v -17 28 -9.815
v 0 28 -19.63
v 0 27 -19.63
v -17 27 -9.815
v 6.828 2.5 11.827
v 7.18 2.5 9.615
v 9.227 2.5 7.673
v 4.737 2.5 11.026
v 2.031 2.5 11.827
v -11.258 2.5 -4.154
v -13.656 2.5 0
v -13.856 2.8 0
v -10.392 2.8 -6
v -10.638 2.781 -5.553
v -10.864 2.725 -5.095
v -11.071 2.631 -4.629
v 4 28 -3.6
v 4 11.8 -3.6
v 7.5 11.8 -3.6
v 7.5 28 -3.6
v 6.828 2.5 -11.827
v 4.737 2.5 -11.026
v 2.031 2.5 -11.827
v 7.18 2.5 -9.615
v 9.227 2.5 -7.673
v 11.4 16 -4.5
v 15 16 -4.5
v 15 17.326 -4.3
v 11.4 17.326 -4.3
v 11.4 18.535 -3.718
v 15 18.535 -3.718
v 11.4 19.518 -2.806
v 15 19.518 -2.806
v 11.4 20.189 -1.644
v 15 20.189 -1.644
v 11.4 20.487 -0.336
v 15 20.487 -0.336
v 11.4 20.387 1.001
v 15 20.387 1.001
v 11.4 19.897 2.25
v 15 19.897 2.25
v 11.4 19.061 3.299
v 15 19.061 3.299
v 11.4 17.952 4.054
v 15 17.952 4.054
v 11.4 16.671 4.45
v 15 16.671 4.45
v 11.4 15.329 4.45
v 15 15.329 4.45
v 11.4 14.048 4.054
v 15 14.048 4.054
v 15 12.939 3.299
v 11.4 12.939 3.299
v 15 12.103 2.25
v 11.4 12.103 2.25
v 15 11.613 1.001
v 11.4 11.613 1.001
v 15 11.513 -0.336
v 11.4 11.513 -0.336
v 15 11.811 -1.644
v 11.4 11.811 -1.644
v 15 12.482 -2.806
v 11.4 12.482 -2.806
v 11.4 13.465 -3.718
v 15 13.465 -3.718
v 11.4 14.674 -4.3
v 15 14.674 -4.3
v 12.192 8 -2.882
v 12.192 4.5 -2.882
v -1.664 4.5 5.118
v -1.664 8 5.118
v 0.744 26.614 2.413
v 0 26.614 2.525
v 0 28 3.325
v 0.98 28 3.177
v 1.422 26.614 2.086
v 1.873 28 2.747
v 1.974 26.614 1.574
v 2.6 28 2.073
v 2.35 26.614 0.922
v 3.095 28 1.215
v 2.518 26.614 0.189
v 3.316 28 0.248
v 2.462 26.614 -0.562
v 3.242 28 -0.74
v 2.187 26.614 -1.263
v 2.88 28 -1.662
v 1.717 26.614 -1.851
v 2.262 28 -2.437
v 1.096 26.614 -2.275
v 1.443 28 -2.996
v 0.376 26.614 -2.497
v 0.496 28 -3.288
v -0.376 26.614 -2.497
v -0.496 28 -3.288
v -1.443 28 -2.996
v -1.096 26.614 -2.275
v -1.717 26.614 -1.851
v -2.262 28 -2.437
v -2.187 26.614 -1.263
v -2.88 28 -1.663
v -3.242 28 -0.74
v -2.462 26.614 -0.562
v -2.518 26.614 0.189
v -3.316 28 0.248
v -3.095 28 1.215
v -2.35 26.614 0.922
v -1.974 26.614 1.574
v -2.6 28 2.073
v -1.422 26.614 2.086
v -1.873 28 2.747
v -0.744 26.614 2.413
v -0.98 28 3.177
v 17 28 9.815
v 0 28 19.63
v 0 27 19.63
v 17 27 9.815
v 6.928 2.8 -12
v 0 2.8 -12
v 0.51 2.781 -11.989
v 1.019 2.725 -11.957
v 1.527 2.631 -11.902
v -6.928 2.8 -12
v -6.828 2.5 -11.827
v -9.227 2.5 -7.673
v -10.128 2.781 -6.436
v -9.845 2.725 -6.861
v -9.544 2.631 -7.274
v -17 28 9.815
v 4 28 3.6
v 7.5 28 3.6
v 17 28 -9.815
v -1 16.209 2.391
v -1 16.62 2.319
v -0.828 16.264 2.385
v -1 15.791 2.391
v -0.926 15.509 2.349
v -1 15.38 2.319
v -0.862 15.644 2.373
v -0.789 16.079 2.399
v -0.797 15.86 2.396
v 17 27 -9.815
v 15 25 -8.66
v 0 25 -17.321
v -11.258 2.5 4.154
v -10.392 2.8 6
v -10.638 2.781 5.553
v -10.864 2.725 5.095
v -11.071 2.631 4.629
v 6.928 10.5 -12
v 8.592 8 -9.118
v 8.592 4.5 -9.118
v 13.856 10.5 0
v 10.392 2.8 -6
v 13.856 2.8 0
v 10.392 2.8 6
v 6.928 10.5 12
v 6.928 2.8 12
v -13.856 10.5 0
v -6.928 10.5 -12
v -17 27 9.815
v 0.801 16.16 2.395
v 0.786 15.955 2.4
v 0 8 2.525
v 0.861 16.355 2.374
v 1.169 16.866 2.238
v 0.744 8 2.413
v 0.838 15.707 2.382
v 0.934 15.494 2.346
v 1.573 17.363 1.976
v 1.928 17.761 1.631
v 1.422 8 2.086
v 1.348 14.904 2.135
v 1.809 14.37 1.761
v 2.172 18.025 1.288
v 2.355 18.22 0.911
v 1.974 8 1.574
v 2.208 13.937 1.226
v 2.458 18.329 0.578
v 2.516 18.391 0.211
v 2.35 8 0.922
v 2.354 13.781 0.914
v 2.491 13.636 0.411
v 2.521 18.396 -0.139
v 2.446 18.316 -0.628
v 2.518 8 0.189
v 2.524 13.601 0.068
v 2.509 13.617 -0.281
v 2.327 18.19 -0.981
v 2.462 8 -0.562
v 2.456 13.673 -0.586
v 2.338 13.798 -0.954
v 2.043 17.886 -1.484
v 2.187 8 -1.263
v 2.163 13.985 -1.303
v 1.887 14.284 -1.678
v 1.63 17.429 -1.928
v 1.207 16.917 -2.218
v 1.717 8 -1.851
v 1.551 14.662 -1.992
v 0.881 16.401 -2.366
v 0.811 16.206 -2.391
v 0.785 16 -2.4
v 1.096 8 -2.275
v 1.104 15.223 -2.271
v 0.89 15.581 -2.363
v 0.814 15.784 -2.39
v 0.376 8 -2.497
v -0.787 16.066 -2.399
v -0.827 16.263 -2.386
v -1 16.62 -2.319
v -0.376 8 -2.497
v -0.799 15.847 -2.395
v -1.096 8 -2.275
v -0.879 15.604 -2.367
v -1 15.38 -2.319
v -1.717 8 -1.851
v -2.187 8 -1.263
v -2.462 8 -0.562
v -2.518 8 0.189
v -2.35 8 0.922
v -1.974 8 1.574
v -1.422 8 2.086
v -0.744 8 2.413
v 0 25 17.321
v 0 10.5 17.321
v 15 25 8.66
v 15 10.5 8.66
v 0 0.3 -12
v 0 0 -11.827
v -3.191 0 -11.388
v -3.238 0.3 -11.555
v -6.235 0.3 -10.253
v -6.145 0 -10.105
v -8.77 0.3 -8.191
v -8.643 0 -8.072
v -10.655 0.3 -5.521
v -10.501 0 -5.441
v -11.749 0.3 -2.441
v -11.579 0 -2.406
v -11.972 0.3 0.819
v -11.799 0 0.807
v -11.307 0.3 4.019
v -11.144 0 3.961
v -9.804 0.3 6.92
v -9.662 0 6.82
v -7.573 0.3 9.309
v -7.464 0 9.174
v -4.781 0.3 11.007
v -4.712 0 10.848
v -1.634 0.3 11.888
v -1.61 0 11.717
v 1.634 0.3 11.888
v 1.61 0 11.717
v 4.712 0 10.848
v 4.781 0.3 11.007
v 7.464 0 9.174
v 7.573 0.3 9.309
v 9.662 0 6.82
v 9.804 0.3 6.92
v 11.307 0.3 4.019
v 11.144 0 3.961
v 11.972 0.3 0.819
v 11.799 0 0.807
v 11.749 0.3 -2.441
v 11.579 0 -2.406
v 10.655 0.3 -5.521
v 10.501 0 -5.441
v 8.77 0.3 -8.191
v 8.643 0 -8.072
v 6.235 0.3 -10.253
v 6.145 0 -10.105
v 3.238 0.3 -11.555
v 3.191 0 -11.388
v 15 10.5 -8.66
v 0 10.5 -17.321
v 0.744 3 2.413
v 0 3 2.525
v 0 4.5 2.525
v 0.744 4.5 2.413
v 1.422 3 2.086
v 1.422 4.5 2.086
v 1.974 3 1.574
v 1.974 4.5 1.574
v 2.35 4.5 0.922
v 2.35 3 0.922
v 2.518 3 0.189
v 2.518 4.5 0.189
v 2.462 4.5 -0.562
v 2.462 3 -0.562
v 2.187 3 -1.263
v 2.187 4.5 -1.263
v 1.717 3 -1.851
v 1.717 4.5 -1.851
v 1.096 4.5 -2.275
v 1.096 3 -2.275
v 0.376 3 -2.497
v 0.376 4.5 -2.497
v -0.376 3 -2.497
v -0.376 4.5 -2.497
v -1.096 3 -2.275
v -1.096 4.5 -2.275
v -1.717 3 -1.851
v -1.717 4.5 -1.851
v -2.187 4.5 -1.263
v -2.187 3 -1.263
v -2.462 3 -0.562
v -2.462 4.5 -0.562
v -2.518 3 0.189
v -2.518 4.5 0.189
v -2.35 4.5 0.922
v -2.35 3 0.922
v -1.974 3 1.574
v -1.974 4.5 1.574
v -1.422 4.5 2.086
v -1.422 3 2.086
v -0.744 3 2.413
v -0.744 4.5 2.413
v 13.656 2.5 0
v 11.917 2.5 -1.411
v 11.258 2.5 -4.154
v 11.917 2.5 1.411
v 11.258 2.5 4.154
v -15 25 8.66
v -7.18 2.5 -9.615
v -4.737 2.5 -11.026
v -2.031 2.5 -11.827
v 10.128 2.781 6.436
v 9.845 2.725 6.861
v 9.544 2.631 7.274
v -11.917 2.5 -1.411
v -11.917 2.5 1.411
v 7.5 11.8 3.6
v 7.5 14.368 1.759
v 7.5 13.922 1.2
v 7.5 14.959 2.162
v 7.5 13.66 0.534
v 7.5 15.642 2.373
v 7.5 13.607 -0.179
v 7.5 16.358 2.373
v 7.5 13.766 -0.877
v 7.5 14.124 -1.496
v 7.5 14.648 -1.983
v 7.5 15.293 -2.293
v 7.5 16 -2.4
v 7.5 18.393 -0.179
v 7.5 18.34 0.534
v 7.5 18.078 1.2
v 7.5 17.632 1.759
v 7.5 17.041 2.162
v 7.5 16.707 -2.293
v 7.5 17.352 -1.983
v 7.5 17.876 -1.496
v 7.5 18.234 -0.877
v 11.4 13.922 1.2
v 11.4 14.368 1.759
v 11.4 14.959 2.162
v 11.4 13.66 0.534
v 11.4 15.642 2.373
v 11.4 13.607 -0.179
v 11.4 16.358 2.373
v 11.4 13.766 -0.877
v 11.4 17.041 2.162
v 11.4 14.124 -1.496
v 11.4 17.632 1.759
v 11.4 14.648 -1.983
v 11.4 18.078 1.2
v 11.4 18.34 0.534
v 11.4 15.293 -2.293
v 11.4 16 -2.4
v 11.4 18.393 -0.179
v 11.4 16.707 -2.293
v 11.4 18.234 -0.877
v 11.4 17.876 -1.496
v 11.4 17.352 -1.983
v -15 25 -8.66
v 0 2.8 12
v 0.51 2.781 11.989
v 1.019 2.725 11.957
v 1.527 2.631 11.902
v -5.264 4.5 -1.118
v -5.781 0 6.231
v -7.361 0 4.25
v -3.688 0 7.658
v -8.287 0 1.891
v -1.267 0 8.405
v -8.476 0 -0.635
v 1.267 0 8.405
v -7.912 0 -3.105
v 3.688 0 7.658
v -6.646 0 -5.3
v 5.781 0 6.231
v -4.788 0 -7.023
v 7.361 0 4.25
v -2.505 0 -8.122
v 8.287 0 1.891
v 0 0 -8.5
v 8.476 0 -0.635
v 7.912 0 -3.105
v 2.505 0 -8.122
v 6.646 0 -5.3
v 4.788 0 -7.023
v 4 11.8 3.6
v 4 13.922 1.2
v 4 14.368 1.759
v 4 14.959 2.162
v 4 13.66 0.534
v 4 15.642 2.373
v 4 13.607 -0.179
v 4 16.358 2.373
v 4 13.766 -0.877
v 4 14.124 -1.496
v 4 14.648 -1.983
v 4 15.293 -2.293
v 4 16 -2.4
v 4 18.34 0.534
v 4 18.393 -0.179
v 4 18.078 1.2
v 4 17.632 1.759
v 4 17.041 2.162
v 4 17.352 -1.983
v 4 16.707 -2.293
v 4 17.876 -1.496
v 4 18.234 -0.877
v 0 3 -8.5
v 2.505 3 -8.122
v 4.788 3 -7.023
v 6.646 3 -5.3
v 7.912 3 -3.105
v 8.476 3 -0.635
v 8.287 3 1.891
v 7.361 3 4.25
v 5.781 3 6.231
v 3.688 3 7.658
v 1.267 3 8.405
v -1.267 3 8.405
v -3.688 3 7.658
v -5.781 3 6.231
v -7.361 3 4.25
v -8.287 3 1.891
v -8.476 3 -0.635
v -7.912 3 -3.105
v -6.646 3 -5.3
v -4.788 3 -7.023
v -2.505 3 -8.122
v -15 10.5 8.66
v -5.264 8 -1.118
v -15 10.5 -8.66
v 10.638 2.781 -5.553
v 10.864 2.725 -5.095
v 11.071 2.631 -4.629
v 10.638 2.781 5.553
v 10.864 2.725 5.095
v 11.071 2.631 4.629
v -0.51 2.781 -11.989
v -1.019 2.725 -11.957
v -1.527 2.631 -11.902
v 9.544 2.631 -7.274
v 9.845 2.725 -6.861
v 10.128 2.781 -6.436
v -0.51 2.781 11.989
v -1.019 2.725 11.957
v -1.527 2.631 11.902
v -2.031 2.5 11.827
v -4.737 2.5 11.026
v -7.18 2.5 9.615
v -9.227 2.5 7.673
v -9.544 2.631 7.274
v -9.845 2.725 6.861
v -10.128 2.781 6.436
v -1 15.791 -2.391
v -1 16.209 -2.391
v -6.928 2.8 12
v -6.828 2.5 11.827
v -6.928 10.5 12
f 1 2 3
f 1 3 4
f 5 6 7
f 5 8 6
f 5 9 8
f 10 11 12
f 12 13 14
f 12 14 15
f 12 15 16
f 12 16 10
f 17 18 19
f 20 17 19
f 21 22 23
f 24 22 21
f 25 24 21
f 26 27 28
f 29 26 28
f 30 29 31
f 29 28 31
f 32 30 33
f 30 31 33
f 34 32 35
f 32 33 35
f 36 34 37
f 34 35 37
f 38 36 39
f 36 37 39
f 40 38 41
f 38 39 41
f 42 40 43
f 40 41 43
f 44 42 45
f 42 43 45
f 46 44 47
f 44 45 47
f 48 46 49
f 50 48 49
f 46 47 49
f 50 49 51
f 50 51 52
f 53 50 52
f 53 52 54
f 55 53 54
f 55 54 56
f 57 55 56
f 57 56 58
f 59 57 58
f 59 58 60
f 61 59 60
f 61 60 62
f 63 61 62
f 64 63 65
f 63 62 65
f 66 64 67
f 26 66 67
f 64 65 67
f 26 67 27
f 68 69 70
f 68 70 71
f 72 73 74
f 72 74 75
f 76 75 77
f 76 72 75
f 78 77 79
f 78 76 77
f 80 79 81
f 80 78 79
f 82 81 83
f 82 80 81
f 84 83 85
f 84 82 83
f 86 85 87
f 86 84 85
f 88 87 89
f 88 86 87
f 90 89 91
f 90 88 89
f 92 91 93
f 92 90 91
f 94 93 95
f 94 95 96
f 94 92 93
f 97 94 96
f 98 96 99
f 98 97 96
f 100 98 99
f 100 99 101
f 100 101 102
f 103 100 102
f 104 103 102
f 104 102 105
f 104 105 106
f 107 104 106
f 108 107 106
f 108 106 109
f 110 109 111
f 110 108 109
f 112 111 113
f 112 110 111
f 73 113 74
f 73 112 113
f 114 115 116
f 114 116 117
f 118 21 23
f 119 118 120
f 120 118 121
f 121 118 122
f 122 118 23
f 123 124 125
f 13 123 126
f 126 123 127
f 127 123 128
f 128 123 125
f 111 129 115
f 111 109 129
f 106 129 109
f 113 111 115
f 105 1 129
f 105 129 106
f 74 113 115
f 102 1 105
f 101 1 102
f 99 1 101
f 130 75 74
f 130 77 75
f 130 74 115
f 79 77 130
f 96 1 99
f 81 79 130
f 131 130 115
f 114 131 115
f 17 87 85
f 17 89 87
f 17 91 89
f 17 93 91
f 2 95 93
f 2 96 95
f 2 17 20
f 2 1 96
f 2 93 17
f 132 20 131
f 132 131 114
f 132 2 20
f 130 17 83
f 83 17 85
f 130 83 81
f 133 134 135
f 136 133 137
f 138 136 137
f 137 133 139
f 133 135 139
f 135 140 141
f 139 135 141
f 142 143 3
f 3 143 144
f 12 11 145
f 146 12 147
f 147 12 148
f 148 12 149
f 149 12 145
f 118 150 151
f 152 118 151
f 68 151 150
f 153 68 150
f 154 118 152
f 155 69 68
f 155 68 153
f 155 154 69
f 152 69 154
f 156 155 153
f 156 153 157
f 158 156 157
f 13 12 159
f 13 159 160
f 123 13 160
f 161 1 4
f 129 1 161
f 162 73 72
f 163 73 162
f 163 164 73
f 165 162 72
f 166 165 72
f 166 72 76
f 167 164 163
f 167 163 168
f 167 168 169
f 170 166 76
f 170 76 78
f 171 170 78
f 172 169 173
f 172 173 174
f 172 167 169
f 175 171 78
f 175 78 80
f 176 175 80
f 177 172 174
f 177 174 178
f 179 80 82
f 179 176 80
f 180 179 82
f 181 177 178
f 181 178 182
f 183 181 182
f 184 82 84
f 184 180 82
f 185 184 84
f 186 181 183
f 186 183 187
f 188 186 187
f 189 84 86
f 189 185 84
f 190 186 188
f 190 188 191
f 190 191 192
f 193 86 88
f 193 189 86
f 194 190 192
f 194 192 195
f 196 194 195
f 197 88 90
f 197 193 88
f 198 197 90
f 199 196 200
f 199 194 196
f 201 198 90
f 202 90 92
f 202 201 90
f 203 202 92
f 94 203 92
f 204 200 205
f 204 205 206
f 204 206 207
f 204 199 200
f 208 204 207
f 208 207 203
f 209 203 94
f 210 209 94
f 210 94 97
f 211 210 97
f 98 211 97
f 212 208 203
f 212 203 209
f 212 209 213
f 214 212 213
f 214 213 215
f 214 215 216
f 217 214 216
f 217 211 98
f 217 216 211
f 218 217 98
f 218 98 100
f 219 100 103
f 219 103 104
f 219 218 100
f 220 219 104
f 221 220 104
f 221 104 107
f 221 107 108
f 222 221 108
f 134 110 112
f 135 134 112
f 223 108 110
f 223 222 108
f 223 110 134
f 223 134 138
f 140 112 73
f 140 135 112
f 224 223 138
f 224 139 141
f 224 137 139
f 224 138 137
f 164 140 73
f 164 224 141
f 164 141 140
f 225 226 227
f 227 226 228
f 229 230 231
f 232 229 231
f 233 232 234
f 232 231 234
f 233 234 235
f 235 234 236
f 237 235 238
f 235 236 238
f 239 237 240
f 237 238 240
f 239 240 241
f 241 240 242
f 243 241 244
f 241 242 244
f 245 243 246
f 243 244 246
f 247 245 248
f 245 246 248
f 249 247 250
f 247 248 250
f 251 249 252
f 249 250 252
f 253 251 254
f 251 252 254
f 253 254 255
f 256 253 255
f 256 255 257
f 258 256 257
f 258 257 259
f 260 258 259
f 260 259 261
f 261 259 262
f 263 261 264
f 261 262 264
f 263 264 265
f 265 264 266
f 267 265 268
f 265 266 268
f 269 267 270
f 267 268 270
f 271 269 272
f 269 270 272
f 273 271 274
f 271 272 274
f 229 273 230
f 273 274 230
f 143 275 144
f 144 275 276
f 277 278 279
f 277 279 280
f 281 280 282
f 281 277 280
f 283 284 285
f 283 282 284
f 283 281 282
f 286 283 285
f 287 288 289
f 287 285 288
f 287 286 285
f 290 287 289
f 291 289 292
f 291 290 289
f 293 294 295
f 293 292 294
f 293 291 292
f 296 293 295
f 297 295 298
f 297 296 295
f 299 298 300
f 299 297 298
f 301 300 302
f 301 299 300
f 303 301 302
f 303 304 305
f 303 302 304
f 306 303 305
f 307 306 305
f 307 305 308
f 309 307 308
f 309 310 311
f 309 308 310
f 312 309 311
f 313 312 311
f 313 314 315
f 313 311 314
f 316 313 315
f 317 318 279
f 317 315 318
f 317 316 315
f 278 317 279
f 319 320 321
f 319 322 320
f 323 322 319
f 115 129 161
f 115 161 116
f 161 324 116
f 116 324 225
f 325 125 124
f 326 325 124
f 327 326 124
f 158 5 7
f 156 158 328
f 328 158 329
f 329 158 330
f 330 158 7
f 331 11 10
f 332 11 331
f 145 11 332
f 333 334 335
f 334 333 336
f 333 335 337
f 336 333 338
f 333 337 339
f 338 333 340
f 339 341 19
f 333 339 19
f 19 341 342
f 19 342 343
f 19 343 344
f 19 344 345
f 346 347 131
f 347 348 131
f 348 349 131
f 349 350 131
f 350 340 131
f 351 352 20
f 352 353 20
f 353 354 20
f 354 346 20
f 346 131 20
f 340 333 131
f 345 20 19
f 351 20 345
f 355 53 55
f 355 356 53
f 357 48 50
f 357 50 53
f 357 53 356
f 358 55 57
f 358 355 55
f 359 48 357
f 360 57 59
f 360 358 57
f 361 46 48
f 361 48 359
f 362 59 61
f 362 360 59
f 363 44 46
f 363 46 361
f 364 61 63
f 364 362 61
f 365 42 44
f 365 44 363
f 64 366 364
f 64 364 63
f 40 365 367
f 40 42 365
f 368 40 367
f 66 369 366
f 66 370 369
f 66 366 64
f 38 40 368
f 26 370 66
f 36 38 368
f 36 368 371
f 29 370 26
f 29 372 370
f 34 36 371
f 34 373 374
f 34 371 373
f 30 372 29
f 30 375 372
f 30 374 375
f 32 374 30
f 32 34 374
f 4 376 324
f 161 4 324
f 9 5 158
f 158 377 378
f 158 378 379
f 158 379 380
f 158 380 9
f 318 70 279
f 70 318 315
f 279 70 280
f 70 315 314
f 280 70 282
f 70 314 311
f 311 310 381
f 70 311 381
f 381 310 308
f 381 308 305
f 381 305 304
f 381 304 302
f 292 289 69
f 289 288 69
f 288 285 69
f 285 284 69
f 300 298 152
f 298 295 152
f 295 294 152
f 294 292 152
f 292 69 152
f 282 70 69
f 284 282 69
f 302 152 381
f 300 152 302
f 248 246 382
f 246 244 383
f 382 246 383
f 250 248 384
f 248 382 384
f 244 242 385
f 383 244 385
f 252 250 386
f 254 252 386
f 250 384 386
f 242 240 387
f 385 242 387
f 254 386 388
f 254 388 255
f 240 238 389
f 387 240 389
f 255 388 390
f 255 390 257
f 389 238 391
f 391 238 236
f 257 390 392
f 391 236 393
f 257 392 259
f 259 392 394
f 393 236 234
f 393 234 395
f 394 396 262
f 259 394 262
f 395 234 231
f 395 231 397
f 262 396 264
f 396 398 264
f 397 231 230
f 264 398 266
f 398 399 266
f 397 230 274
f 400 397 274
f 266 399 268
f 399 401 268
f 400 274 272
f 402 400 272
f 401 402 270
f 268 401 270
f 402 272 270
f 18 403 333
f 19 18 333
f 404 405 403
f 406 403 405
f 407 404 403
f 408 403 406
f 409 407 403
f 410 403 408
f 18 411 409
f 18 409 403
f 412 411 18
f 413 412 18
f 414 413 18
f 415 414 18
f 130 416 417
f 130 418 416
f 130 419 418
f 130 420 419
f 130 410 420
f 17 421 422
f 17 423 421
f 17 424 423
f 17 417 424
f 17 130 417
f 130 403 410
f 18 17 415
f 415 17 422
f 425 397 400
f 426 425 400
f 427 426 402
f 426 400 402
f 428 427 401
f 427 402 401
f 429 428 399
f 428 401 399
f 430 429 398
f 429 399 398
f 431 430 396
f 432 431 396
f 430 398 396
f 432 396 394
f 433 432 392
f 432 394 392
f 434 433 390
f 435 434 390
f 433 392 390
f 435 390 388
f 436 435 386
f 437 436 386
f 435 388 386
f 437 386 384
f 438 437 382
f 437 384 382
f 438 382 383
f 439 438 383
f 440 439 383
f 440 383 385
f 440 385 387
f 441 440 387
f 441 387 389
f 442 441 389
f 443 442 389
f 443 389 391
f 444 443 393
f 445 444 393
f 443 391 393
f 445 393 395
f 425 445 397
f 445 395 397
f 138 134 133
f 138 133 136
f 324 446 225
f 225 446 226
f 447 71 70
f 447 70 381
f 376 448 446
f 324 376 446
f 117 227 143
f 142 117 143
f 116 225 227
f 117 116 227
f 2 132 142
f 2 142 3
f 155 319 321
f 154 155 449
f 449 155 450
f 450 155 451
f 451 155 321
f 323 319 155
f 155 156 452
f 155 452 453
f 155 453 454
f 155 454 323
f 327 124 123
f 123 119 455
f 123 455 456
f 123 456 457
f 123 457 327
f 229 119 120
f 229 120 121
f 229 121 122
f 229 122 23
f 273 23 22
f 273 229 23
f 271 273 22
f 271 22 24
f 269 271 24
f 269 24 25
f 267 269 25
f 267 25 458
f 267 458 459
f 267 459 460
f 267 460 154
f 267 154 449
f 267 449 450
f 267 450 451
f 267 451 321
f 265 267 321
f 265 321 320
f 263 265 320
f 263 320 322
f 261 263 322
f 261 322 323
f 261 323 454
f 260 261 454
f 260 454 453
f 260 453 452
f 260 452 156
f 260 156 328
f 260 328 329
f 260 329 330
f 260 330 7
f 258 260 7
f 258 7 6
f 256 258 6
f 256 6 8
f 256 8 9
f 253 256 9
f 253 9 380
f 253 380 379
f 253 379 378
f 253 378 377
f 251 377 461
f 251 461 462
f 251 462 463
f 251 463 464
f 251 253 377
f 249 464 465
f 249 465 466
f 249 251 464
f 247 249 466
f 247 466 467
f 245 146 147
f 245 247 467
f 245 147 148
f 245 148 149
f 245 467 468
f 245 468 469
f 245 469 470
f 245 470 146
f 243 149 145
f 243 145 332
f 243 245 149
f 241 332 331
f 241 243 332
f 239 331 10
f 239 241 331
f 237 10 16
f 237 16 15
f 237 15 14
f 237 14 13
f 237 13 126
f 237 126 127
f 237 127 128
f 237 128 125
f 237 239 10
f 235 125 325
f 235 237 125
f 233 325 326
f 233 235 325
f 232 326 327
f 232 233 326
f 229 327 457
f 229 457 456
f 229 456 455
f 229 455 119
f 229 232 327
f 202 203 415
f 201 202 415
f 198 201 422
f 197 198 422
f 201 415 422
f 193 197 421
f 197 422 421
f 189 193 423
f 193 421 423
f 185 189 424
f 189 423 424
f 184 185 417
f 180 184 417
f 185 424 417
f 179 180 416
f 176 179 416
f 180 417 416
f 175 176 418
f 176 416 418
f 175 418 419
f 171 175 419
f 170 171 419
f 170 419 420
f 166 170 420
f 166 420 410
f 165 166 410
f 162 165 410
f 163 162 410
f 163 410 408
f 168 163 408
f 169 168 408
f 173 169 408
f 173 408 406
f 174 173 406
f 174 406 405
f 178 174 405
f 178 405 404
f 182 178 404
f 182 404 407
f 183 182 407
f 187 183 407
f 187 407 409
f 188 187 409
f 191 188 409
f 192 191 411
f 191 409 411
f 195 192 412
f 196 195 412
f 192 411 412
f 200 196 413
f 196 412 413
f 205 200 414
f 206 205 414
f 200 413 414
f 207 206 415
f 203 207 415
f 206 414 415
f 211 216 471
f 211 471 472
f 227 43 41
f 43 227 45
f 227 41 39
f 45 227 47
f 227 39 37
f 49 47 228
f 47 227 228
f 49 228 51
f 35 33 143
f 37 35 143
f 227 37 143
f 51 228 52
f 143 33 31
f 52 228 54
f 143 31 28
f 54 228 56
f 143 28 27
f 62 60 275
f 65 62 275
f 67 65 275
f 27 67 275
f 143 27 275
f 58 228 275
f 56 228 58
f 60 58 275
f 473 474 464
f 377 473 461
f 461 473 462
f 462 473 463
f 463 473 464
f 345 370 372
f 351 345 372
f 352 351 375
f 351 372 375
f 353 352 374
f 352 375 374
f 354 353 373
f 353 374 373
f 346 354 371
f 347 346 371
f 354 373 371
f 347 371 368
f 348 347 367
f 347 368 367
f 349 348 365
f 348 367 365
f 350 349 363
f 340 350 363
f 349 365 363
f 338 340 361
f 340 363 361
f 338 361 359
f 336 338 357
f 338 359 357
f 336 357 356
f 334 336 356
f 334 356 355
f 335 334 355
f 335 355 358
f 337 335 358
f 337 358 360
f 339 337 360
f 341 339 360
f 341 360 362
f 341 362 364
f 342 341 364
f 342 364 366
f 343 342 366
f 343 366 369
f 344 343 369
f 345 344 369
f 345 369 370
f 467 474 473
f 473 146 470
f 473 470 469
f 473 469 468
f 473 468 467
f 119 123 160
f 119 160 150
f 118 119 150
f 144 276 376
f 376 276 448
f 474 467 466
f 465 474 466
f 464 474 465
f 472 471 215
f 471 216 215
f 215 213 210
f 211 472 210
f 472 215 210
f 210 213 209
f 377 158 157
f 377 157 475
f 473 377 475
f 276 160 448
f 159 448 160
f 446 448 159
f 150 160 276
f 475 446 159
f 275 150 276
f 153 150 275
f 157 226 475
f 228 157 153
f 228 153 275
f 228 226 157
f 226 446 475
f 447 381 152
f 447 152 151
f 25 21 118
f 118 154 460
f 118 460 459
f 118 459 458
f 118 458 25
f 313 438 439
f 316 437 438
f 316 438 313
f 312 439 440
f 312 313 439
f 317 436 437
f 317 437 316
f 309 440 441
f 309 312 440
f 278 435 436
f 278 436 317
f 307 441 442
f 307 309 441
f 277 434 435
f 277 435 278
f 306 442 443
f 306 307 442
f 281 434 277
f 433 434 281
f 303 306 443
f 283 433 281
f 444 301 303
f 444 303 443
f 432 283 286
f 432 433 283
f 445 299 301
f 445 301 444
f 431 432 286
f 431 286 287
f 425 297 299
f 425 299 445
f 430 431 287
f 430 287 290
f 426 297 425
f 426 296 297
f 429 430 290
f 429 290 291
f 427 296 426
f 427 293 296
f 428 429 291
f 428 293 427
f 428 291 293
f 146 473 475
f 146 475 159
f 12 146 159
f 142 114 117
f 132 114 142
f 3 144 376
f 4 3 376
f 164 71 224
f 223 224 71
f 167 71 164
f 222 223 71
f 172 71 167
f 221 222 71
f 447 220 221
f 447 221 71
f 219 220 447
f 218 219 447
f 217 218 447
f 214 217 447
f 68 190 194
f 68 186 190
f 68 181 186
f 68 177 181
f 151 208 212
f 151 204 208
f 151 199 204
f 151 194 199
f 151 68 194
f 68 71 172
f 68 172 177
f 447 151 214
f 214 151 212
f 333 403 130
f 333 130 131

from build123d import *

# Parameters (mm, degrees)
SKIZZE1_R                       = 2.525
AUFSATZ_LINEAR_AUSTRAGEN1_DEPTH = 28
SKIZZE2_W                       = 3.5
SKIZZE2_H                       = 7.2
SCHNITT_LINEAR_AUSTRAGEN1_DEPTH = 16.2
SKIZZE4_R                       = 2.4
SCHNITT_LINEAR_AUSTRAGEN2_DEPTH = 16
SKIZZE6_R                       = 14.009035946
AUFSATZ_LINEAR_AUSTRAGEN3_DEPTH = 3
SKIZZE7_R                       = 20
SCHNITT_LINEAR_AUSTRAGEN4_DEPTH = 10.5
FASE1_SIZE                      = 0.8
FASE1_SIZE2                     = 1.385640646
SKIZZE9_W                       = 7.2
SKIZZE9_H                       = 3.5
SCHNITT_LINEAR_AUSTRAGEN5_DEPTH = 16
SKIZZE10_R                      = 8.5
SCHNITT_LINEAR_AUSTRAGEN6_DEPTH = 3
FASE2_SIZE                      = 2
SKIZZE11_R                      = 4.5
SCHNITT_LINEAR_AUSTRAGEN7_DEPTH = 3.6
SKIZZE12_R                      = 14.338361474
SKIZZE12_R_2                    = 12
SCHNITT_LINEAR_AUSTRAGEN8_DEPTH = 2.5
FASE3_SIZE                      = 0.3
FASE3_SIZE2                     = 0.173205081
FASE4_SIZE                      = 0.173205081
FASE4_SIZE_2                    = 0.3


# Some blends are built 0.0001 mm under size
with BuildPart() as part:
    # Skizze1 → Aufsatz-Linear austragen1 (new body)
    with BuildSketch(Plane(origin=(0, 0, 0), x_dir=(1, 0, 0), z_dir=(0, 1, 0))):
        Polygon((15, 8.660254038), (0, 17.320508076), (-15, 8.660254038), (-15, -8.660254038), (0, -17.320508076), (15, -8.660254038), align=None)
        with Locations(Location((0, 0, 0), (0, 0, 270))):
            Circle(SKIZZE1_R, mode=Mode.SUBTRACT)
    extrude(amount=AUFSATZ_LINEAR_AUSTRAGEN1_DEPTH)

    # Skizze2 → Schnitt-Linear austragen1 (cut)
    with BuildSketch(Plane(origin=(0, 28, 0), x_dir=(1, 0, 0), z_dir=(0, 1, 0))):
        with Locations((5.75, 0)):
            Rectangle(SKIZZE2_W, SKIZZE2_H)
    extrude(amount=-SCHNITT_LINEAR_AUSTRAGEN1_DEPTH, mode=Mode.SUBTRACT)

    # Skizze4 → Schnitt-Linear austragen2 (cut)
    with BuildSketch(Plane(origin=(15, 0, 0), x_dir=(0, 0, -1), z_dir=(1, 0, 0))):
        with Locations((0, 16)):
            Circle(SKIZZE4_R)
    extrude(amount=-SCHNITT_LINEAR_AUSTRAGEN2_DEPTH, mode=Mode.SUBTRACT)

    # Skizze6 → Aufsatz-Linear austragen3 (add)
    with BuildSketch(Plane(origin=(0, 28, 0), x_dir=(1, 0, 0), z_dir=(0, 1, 0))):
        Polygon((0, -19.629909152), (17, -9.814954576), (17, 9.814954576), (0, 19.629909152), (-17, 9.814954576), (-17, -9.814954576), align=None)
        Circle(SKIZZE6_R, mode=Mode.SUBTRACT)
    extrude(amount=-AUFSATZ_LINEAR_AUSTRAGEN3_DEPTH)

    # Skizze7 → Schnitt-Linear austragen4 (cut)
    with BuildSketch(Plane.XZ):
        Circle(SKIZZE7_R)
        Polygon((-6.92820323, 12), (-13.856406461, 0), (-6.92820323, -12), (6.92820323, -12), (13.856406461, 0), (6.92820323, 12), align=None, mode=Mode.SUBTRACT)
    extrude(amount=-SCHNITT_LINEAR_AUSTRAGEN4_DEPTH, mode=Mode.SUBTRACT)

    # Fase1
    fase1_edges = [part.edges().sort_by_distance(p)[0] for p in [
        (0, 28, -2.525),
    ]]
    fase1_side = [part.faces().sort_by_distance(p)[0] for p in [
        (0, 28, -3.044358579),
    ]]
    chamfer(fase1_edges, length=FASE1_SIZE, length2=FASE1_SIZE2, reference=fase1_side[0])

    # Skizze9 → Schnitt-Linear austragen5 (cut)
    with BuildSketch(Plane(origin=(10.392304845, 0, -6), x_dir=(-0.49999999999999983, 0, -0.8660254037844387), z_dir=(0.8660254037844387, 0, -0.49999999999999983))):
        with Locations((0, 6.25)):
            Rectangle(SKIZZE9_W, SKIZZE9_H)
    extrude(amount=-SCHNITT_LINEAR_AUSTRAGEN5_DEPTH, mode=Mode.SUBTRACT)

    # Skizze10 → Schnitt-Linear austragen6 (cut)
    with BuildSketch(Plane.XZ):
        with Locations(Location((0, 0, 0), (0, 0, 270))):
            Circle(SKIZZE10_R)
    extrude(amount=-SCHNITT_LINEAR_AUSTRAGEN6_DEPTH, mode=Mode.SUBTRACT)

    # Fase2
    fase2_edges = [part.edges().sort_by_distance(p)[0] for p in [
        (-8.5, 25, 14.722431864),
        (-17, 25, 0),
        (-8.5, 25, -14.722431864),
        (8.5, 25, -14.722431864),
        (17, 25, 0),
        (8.5, 25, 14.722431864),
    ]]
    chamfer(fase2_edges, length=FASE2_SIZE - 0.0001)  # a hair under: the kernel refuses the full size

    # Skizze11 → Schnitt-Linear austragen7 (cut)
    with BuildSketch(Plane(origin=(15, 0, 0), x_dir=(0, 0, -1), z_dir=(1, 0, 0))):
        with Locations((0, 16)):
            Circle(SKIZZE11_R)
    extrude(amount=-SCHNITT_LINEAR_AUSTRAGEN7_DEPTH, mode=Mode.SUBTRACT)

    # Skizze12 → Schnitt-Linear austragen8 (cut)
    with BuildSketch(Plane.XZ):
        Circle(SKIZZE12_R)
        with Locations(Location((0, 0, 0), (0, 0, 270))):
            Circle(SKIZZE12_R_2, mode=Mode.SUBTRACT)
    extrude(amount=-SCHNITT_LINEAR_AUSTRAGEN8_DEPTH, mode=Mode.SUBTRACT)

    # Fase3
    fase3_edges = [part.edges().sort_by_distance(p)[0] for p in [
        (0, 0, 12),
    ]]
    fase3_side = [part.faces().sort_by_distance(p)[0] for p in [
        (0, 1.25, 12),
    ]]
    chamfer(fase3_edges, length=FASE3_SIZE, length2=FASE3_SIZE2, reference=fase3_side[0])

    # Fase4
    # the kernel refuses this chamfer: 0.3, 0.173205081 mm, written as the material it takes off along each edge
    with BuildSketch(Plane(origin=(-10.392304845, 2.5, 6), x_dir=(0.864572857266567, -0.05789386240267096, -0.4991613718768963), z_dir=(0.5, 0, 0.8660254037844387))) as fase4_piece_1_section:
        Polygon((FASE4_SIZE * 0.998322742353, FASE4_SIZE * 0.0578938623214), (-FASE4_SIZE_2 * 0.0578938624027, FASE4_SIZE_2 * 0.998322743754), (0, 0), align=None)
    fase4_piece_1 = extrude(amount=7.704328957, mode=Mode.PRIVATE)
    fase4_piece_1 = fase4_piece_1 - Plane(origin=(0, 2.602492353, 0), x_dir=(0, 0, -1), z_dir=(0, -1, 0)) * Cylinder(12, 17, mode=Mode.PRIVATE)
    add(fase4_piece_1, mode=Mode.SUBTRACT)
    with BuildSketch(Plane(origin=(-14.244469324, 2.5, -0.672144596), x_dir=(0.864572857266567, -0.05789386240267102, -0.4991613718768963), z_dir=(0.5, 0, 0.8660254037844387))) as fase4_piece_2_section:
        Polygon((FASE4_SIZE * 0.998322742353, FASE4_SIZE * 0.0578938623214), (-FASE4_SIZE_2 * 0.0578938624027, FASE4_SIZE_2 * 0.998322743754), (0, 0), align=None)
    fase4_piece_2 = extrude(amount=7.704328957, mode=Mode.PRIVATE)
    fase4_piece_2 = fase4_piece_2 - Plane(origin=(0, 2.602492354, 0), x_dir=(0, 0, -1), z_dir=(0, -1, 0)) * Cylinder(12, 17, mode=Mode.PRIVATE)
    add(fase4_piece_2, mode=Mode.SUBTRACT)
    with BuildSketch(Plane(origin=(-7.704328957, 2.5, 12), x_dir=(0, -0.057893862402670936, -0.9983227437537926), z_dir=(1, 0, 0))) as fase4_piece_3_section:
        Polygon((FASE4_SIZE * 0.998322742353, FASE4_SIZE * 0.0578938623214), (-FASE4_SIZE_2 * 0.0578938624027, FASE4_SIZE_2 * 0.998322743754), (0, 0), align=None)
    fase4_piece_3 = extrude(amount=7.704328957, mode=Mode.PRIVATE)
    fase4_piece_3 = fase4_piece_3 - Plane(origin=(0, 2.602492354, 0), x_dir=(0, 0, -1), z_dir=(0, -1, 0)) * Cylinder(12, 17, mode=Mode.PRIVATE)
    add(fase4_piece_3, mode=Mode.SUBTRACT)
    with BuildSketch(Plane(origin=(0, 2.5, 12), x_dir=(0, -0.057893862402670936, -0.9983227437537926), z_dir=(1, 0, 0))) as fase4_piece_4_section:
        Polygon((FASE4_SIZE * 0.998322742353, FASE4_SIZE * 0.0578938623214), (-FASE4_SIZE_2 * 0.0578938624027, FASE4_SIZE_2 * 0.998322743754), (0, 0), align=None)
    fase4_piece_4 = extrude(amount=7.704328957, mode=Mode.PRIVATE)
    fase4_piece_4 = fase4_piece_4 - Plane(origin=(0, 2.602492353, 0), x_dir=(0, 0, -1), z_dir=(0, -1, 0)) * Cylinder(12, 17, mode=Mode.PRIVATE)
    add(fase4_piece_4, mode=Mode.SUBTRACT)
    with BuildSketch(Plane(origin=(6.540140367, 2.5, 12.672144596), x_dir=(-0.864572857266567, -0.05789386240267135, -0.49916137187689613), z_dir=(0.4999999999999999, 0, -0.8660254037844388))) as fase4_piece_5_section:
        Polygon((FASE4_SIZE * 0.998322742353, FASE4_SIZE * 0.0578938623214), (-FASE4_SIZE_2 * 0.0578938624027, FASE4_SIZE_2 * 0.998322743754), (0, 0), align=None)
    fase4_piece_5 = extrude(amount=7.704328957, mode=Mode.PRIVATE)
    fase4_piece_5 = fase4_piece_5 - Plane(origin=(0, 2.602492354, 0), x_dir=(0, 0, -1), z_dir=(0, -1, 0)) * Cylinder(12, 17, mode=Mode.PRIVATE)
    add(fase4_piece_5, mode=Mode.SUBTRACT)
    with BuildSketch(Plane(origin=(10.392304845, 2.5, 6), x_dir=(-0.864572857266567, -0.05789386240267096, -0.49916137187689613), z_dir=(0.4999999999999999, 0, -0.8660254037844388))) as fase4_piece_6_section:
        Polygon((FASE4_SIZE * 0.998322742353, FASE4_SIZE * 0.0578938623214), (-FASE4_SIZE_2 * 0.0578938624027, FASE4_SIZE_2 * 0.998322743754), (0, 0), align=None)
    fase4_piece_6 = extrude(amount=7.704328957, mode=Mode.PRIVATE)
    fase4_piece_6 = fase4_piece_6 - Plane(origin=(0, 2.602492353, 0), x_dir=(0, 0, -1), z_dir=(0, -1, 0)) * Cylinder(12, 17, mode=Mode.PRIVATE)
    add(fase4_piece_6, mode=Mode.SUBTRACT)
    with BuildSketch(Plane(origin=(14.244469324, 2.5, 0.672144596), x_dir=(-0.8645728572665671, -0.05789386240267102, 0.49916137187689597), z_dir=(-0.49999999999999967, 0, -0.8660254037844388))) as fase4_piece_7_section:
        Polygon((FASE4_SIZE * 0.998322742353, FASE4_SIZE * 0.0578938623214), (-FASE4_SIZE_2 * 0.0578938624027, FASE4_SIZE_2 * 0.998322743754), (0, 0), align=None)
    fase4_piece_7 = extrude(amount=7.704328957, mode=Mode.PRIVATE)
    fase4_piece_7 = fase4_piece_7 - Plane(origin=(0, 2.602492354, 0), x_dir=(0, 0, -1), z_dir=(0, -1, 0)) * Cylinder(12, 17, mode=Mode.PRIVATE)
    add(fase4_piece_7, mode=Mode.SUBTRACT)
    with BuildSketch(Plane(origin=(10.392304845, 2.5, -6), x_dir=(-0.8645728572665671, -0.05789386240267096, 0.499161371876896), z_dir=(-0.49999999999999967, 0, -0.8660254037844388))) as fase4_piece_8_section:
        Polygon((FASE4_SIZE * 0.998322742353, FASE4_SIZE * 0.0578938623214), (-FASE4_SIZE_2 * 0.0578938624027, FASE4_SIZE_2 * 0.998322743754), (0, 0), align=None)
    fase4_piece_8 = extrude(amount=7.704328957, mode=Mode.PRIVATE)
    fase4_piece_8 = fase4_piece_8 - Plane(origin=(0, 2.602492353, 0), x_dir=(0, 0, -1), z_dir=(0, -1, 0)) * Cylinder(12, 17, mode=Mode.PRIVATE)
    add(fase4_piece_8, mode=Mode.SUBTRACT)
    with BuildSketch(Plane(origin=(7.704328957, 2.5, -12), x_dir=(0, -0.057893862402670936, 0.9983227437537926), z_dir=(-1, 0, 0))) as fase4_piece_9_section:
        Polygon((FASE4_SIZE * 0.998322742353, FASE4_SIZE * 0.0578938623214), (-FASE4_SIZE_2 * 0.0578938624027, FASE4_SIZE_2 * 0.998322743754), (0, 0), align=None)
    fase4_piece_9 = extrude(amount=7.704328957, mode=Mode.PRIVATE)
    fase4_piece_9 = fase4_piece_9 - Plane(origin=(0, 2.602492354, 0), x_dir=(0, 0, -1), z_dir=(0, -1, 0)) * Cylinder(12, 17, mode=Mode.PRIVATE)
    add(fase4_piece_9, mode=Mode.SUBTRACT)
    with BuildSketch(Plane(origin=(0, 2.5, -12), x_dir=(0, -0.057893862402670936, 0.9983227437537926), z_dir=(-1, 0, 0))) as fase4_piece_10_section:
        Polygon((FASE4_SIZE * 0.998322742353, FASE4_SIZE * 0.0578938623214), (-FASE4_SIZE_2 * 0.0578938624027, FASE4_SIZE_2 * 0.998322743754), (0, 0), align=None)
    fase4_piece_10 = extrude(amount=7.704328957, mode=Mode.PRIVATE)
    fase4_piece_10 = fase4_piece_10 - Plane(origin=(0, 2.602492354, 0), x_dir=(0, 0, -1), z_dir=(0, -1, 0)) * Cylinder(12, 17, mode=Mode.PRIVATE)
    add(fase4_piece_10, mode=Mode.SUBTRACT)
    with BuildSketch(Plane(origin=(-6.540140367, 2.5, -12.672144596), x_dir=(0.864572857266567, -0.05789386240267136, 0.49916137187689624), z_dir=(-0.4999999999999999, 0, 0.8660254037844387))) as fase4_piece_11_section:
        Polygon((FASE4_SIZE * 0.998322742353, FASE4_SIZE * 0.0578938623214), (-FASE4_SIZE_2 * 0.0578938624027, FASE4_SIZE_2 * 0.998322743754), (0, 0), align=None)
    fase4_piece_11 = extrude(amount=7.704328957, mode=Mode.PRIVATE)
    fase4_piece_11 = fase4_piece_11 - Plane(origin=(0, 2.602492354, 0), x_dir=(0, 0, -1), z_dir=(0, -1, 0)) * Cylinder(12, 17, mode=Mode.PRIVATE)
    add(fase4_piece_11, mode=Mode.SUBTRACT)
    with BuildSketch(Plane(origin=(-10.392304845, 2.5, -6), x_dir=(0.864572857266567, -0.05789386240267096, 0.49916137187689624), z_dir=(-0.4999999999999999, 0, 0.8660254037844387))) as fase4_piece_12_section:
        Polygon((FASE4_SIZE * 0.998322742353, FASE4_SIZE * 0.0578938623214), (-FASE4_SIZE_2 * 0.0578938624027, FASE4_SIZE_2 * 0.998322743754), (0, 0), align=None)
    fase4_piece_12 = extrude(amount=7.704328957, mode=Mode.PRIVATE)
    fase4_piece_12 = fase4_piece_12 - Plane(origin=(0, 2.602492353, 0), x_dir=(0, 0, -1), z_dir=(0, -1, 0)) * Cylinder(12, 17, mode=Mode.PRIVATE)
    add(fase4_piece_12, mode=Mode.SUBTRACT)


solid = part.part
